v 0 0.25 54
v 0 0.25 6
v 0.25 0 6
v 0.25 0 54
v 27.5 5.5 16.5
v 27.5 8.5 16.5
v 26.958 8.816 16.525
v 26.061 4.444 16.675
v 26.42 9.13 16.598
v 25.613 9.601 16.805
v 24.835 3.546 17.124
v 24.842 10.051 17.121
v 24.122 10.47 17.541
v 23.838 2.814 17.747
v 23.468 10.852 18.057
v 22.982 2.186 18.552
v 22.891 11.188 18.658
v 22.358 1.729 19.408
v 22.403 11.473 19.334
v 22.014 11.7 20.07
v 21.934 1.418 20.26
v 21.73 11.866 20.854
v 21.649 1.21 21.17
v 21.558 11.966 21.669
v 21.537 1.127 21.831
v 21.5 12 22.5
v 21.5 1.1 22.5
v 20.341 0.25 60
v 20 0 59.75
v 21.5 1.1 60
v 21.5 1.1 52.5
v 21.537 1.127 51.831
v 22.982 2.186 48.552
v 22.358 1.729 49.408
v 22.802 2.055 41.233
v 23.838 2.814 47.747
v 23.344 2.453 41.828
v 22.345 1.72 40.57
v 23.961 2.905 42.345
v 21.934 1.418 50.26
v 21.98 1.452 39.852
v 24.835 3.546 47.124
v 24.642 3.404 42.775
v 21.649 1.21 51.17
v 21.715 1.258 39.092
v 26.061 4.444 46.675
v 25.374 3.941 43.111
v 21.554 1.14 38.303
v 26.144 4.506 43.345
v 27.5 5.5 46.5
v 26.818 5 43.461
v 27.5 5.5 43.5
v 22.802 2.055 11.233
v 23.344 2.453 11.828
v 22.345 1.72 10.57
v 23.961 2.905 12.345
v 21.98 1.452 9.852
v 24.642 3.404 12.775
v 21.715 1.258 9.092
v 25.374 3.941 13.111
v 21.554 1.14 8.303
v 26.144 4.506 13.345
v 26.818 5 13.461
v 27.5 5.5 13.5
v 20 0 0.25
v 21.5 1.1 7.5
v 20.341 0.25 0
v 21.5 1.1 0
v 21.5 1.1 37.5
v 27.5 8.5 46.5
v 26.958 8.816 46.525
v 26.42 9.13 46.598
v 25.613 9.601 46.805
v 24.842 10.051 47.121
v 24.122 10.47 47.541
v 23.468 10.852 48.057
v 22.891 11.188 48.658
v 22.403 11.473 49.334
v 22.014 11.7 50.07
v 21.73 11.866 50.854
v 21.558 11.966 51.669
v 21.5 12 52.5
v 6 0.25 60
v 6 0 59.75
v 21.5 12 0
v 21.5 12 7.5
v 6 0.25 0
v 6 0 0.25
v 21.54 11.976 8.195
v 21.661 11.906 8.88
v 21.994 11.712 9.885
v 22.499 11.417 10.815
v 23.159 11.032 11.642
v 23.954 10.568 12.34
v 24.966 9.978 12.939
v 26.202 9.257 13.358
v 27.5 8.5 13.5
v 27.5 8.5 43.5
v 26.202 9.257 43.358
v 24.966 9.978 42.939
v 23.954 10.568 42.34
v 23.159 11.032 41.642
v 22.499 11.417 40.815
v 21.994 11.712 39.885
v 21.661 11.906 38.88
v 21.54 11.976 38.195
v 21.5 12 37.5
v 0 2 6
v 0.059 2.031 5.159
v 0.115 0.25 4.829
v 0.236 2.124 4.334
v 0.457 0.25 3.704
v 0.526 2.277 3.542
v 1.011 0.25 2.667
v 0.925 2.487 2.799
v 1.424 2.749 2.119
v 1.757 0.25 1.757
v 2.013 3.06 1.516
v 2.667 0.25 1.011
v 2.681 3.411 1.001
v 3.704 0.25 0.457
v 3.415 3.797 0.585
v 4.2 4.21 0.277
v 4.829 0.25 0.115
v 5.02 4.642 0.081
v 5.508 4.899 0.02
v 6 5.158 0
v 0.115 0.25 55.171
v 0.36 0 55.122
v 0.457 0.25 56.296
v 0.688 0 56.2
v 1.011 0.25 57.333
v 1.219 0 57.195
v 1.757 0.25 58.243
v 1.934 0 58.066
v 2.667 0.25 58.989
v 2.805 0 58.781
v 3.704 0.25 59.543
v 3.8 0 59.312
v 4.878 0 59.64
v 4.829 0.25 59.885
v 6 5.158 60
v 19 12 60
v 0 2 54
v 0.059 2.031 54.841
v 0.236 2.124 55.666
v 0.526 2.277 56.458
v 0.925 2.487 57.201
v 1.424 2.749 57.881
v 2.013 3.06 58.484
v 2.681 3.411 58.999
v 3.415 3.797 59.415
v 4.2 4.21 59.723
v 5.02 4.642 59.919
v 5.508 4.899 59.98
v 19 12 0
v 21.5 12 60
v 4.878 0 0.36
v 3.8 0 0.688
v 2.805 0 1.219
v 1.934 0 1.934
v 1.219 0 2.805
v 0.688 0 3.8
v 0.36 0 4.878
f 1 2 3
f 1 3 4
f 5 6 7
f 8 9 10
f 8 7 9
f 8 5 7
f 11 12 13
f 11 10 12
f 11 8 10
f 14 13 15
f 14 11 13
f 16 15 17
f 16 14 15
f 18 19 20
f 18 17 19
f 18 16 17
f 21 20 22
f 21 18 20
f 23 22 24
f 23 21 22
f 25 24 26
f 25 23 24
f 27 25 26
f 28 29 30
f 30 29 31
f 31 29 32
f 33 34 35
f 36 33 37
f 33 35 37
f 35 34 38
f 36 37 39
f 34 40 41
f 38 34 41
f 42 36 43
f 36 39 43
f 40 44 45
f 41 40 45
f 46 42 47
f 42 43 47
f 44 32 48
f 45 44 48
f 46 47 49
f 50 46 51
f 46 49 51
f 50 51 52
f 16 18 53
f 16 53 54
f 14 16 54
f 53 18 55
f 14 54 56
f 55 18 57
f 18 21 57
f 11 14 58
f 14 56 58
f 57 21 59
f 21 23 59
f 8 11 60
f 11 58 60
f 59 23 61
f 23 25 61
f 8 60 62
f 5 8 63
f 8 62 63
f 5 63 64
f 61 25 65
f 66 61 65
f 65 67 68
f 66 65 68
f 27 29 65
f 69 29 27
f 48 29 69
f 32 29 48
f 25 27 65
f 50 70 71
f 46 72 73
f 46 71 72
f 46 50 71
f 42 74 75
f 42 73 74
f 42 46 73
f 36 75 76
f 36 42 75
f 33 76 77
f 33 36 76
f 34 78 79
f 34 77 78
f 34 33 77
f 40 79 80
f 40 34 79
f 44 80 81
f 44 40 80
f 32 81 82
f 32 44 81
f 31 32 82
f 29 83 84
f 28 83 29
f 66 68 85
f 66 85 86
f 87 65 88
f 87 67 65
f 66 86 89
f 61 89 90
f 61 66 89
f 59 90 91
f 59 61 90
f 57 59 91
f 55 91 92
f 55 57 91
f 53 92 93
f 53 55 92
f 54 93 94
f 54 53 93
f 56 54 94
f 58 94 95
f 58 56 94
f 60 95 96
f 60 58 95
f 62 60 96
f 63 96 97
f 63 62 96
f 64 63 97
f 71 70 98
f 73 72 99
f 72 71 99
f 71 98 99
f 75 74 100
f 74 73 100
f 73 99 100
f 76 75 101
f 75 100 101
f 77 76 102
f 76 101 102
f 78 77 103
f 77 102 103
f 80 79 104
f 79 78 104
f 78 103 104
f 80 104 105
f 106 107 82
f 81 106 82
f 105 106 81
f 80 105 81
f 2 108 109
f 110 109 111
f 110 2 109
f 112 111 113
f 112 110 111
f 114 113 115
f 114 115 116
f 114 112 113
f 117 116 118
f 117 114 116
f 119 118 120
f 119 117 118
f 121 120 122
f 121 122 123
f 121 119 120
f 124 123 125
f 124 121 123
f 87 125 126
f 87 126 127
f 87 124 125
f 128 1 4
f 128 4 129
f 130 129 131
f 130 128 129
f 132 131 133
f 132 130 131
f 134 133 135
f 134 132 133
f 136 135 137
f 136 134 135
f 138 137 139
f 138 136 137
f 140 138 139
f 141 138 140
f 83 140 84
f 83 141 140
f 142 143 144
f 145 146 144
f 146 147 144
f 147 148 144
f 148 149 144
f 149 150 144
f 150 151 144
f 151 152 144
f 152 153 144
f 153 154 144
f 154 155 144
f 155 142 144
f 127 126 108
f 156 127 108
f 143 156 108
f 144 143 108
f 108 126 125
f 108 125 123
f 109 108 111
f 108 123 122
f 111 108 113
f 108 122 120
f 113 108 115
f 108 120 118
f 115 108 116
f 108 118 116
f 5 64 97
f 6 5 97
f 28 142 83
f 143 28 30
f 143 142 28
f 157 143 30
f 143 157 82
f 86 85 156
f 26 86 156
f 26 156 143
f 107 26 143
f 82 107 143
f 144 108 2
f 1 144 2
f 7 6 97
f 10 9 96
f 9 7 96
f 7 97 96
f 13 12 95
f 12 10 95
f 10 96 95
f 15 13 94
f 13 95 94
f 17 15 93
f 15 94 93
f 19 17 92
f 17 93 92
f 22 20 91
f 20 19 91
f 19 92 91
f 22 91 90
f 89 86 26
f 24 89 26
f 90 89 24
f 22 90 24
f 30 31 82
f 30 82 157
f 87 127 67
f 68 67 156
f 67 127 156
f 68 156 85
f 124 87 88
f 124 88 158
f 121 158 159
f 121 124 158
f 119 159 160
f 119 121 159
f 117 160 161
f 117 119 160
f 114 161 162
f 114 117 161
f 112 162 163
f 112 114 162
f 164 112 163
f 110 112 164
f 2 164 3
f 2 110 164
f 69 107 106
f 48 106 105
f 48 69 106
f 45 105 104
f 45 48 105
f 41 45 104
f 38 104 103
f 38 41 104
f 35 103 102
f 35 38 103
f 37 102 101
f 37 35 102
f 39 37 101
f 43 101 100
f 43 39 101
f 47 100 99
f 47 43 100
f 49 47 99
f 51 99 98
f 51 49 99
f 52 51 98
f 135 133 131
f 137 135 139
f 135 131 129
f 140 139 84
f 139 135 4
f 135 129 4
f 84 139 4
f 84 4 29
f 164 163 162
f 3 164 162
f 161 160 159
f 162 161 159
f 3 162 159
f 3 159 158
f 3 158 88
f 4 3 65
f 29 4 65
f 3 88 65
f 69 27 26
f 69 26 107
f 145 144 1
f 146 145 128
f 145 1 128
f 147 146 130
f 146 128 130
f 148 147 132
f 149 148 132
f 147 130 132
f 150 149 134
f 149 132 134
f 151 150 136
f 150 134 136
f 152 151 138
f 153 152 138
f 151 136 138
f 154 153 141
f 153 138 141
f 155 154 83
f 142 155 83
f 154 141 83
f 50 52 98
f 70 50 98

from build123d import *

# Parameters (mm, degrees)
EXTRUDE1_DEPTH     = 60
CUT_EXTRUDE1_DEPTH = 13
FILLET1_R          = 6
CHAMFER1_SIZE      = 0.25


with BuildPart() as part:
    # Sketch1 → Extrude1 (new body)
    with BuildSketch(Plane.XY):
        Polygon((0, 0), (20, 0), (27.5, 5.5), (27.5, 8.5), (21.5, 12), (19, 12), (0, 2), align=None)
    extrude(amount=EXTRUDE1_DEPTH)

    # Sketch2 → Cut-Extrude1 (cut, through all)
    with BuildSketch(Plane(origin=(0, 0, 0), x_dir=(1, 0, 0), z_dir=(0, 1, 0))):
        with BuildLine():
            Line((27.5, -13.5), (27.5, -16.5))
            ThreePointArc((27.5, -16.5), (23.257359313, -18.257359313), (21.5, -22.5))
            Line((21.5, -22.5), (21.5, -37.5))
            ThreePointArc((21.5, -37.5), (23.257359313, -41.742640687), (27.5, -43.5))
            Line((27.5, -43.5), (27.5, -46.5))
            ThreePointArc((27.5, -46.5), (23.257359313, -48.257359313), (21.5, -52.5))
            Line((21.5, -52.5), (21.5, -60))
            Line((21.5, -60), (28.5, -60))
            Line((28.5, -60), (28.5, 0))
            Line((28.5, 0), (21.5, 0))
            Line((21.5, 0), (21.5, -7.5))
            ThreePointArc((21.5, -7.5), (23.257359313, -11.742640687), (27.5, -13.5))
        make_face()
    extrude(amount=CUT_EXTRUDE1_DEPTH, mode=Mode.SUBTRACT)

    # Fillet1
    fillet1_edges = [part.edges().sort_by_distance(p)[0] for p in [
        (0, 1, 60),
        (0, 1, 0),
    ]]
    fillet(fillet1_edges, radius=FILLET1_R)

    # Chamfer1
    chamfer1_edges = [part.edges().sort_by_distance(p)[0] for p in [
        (0, 0, 30),
        (13, 0, 0),
        (13, 0, 60),
        (1.757359313, 0, 58.242640687),
        (1.757359313, 0, 1.757359313),
    ]]
    chamfer(chamfer1_edges, length=CHAMFER1_SIZE)


solid = part.part
